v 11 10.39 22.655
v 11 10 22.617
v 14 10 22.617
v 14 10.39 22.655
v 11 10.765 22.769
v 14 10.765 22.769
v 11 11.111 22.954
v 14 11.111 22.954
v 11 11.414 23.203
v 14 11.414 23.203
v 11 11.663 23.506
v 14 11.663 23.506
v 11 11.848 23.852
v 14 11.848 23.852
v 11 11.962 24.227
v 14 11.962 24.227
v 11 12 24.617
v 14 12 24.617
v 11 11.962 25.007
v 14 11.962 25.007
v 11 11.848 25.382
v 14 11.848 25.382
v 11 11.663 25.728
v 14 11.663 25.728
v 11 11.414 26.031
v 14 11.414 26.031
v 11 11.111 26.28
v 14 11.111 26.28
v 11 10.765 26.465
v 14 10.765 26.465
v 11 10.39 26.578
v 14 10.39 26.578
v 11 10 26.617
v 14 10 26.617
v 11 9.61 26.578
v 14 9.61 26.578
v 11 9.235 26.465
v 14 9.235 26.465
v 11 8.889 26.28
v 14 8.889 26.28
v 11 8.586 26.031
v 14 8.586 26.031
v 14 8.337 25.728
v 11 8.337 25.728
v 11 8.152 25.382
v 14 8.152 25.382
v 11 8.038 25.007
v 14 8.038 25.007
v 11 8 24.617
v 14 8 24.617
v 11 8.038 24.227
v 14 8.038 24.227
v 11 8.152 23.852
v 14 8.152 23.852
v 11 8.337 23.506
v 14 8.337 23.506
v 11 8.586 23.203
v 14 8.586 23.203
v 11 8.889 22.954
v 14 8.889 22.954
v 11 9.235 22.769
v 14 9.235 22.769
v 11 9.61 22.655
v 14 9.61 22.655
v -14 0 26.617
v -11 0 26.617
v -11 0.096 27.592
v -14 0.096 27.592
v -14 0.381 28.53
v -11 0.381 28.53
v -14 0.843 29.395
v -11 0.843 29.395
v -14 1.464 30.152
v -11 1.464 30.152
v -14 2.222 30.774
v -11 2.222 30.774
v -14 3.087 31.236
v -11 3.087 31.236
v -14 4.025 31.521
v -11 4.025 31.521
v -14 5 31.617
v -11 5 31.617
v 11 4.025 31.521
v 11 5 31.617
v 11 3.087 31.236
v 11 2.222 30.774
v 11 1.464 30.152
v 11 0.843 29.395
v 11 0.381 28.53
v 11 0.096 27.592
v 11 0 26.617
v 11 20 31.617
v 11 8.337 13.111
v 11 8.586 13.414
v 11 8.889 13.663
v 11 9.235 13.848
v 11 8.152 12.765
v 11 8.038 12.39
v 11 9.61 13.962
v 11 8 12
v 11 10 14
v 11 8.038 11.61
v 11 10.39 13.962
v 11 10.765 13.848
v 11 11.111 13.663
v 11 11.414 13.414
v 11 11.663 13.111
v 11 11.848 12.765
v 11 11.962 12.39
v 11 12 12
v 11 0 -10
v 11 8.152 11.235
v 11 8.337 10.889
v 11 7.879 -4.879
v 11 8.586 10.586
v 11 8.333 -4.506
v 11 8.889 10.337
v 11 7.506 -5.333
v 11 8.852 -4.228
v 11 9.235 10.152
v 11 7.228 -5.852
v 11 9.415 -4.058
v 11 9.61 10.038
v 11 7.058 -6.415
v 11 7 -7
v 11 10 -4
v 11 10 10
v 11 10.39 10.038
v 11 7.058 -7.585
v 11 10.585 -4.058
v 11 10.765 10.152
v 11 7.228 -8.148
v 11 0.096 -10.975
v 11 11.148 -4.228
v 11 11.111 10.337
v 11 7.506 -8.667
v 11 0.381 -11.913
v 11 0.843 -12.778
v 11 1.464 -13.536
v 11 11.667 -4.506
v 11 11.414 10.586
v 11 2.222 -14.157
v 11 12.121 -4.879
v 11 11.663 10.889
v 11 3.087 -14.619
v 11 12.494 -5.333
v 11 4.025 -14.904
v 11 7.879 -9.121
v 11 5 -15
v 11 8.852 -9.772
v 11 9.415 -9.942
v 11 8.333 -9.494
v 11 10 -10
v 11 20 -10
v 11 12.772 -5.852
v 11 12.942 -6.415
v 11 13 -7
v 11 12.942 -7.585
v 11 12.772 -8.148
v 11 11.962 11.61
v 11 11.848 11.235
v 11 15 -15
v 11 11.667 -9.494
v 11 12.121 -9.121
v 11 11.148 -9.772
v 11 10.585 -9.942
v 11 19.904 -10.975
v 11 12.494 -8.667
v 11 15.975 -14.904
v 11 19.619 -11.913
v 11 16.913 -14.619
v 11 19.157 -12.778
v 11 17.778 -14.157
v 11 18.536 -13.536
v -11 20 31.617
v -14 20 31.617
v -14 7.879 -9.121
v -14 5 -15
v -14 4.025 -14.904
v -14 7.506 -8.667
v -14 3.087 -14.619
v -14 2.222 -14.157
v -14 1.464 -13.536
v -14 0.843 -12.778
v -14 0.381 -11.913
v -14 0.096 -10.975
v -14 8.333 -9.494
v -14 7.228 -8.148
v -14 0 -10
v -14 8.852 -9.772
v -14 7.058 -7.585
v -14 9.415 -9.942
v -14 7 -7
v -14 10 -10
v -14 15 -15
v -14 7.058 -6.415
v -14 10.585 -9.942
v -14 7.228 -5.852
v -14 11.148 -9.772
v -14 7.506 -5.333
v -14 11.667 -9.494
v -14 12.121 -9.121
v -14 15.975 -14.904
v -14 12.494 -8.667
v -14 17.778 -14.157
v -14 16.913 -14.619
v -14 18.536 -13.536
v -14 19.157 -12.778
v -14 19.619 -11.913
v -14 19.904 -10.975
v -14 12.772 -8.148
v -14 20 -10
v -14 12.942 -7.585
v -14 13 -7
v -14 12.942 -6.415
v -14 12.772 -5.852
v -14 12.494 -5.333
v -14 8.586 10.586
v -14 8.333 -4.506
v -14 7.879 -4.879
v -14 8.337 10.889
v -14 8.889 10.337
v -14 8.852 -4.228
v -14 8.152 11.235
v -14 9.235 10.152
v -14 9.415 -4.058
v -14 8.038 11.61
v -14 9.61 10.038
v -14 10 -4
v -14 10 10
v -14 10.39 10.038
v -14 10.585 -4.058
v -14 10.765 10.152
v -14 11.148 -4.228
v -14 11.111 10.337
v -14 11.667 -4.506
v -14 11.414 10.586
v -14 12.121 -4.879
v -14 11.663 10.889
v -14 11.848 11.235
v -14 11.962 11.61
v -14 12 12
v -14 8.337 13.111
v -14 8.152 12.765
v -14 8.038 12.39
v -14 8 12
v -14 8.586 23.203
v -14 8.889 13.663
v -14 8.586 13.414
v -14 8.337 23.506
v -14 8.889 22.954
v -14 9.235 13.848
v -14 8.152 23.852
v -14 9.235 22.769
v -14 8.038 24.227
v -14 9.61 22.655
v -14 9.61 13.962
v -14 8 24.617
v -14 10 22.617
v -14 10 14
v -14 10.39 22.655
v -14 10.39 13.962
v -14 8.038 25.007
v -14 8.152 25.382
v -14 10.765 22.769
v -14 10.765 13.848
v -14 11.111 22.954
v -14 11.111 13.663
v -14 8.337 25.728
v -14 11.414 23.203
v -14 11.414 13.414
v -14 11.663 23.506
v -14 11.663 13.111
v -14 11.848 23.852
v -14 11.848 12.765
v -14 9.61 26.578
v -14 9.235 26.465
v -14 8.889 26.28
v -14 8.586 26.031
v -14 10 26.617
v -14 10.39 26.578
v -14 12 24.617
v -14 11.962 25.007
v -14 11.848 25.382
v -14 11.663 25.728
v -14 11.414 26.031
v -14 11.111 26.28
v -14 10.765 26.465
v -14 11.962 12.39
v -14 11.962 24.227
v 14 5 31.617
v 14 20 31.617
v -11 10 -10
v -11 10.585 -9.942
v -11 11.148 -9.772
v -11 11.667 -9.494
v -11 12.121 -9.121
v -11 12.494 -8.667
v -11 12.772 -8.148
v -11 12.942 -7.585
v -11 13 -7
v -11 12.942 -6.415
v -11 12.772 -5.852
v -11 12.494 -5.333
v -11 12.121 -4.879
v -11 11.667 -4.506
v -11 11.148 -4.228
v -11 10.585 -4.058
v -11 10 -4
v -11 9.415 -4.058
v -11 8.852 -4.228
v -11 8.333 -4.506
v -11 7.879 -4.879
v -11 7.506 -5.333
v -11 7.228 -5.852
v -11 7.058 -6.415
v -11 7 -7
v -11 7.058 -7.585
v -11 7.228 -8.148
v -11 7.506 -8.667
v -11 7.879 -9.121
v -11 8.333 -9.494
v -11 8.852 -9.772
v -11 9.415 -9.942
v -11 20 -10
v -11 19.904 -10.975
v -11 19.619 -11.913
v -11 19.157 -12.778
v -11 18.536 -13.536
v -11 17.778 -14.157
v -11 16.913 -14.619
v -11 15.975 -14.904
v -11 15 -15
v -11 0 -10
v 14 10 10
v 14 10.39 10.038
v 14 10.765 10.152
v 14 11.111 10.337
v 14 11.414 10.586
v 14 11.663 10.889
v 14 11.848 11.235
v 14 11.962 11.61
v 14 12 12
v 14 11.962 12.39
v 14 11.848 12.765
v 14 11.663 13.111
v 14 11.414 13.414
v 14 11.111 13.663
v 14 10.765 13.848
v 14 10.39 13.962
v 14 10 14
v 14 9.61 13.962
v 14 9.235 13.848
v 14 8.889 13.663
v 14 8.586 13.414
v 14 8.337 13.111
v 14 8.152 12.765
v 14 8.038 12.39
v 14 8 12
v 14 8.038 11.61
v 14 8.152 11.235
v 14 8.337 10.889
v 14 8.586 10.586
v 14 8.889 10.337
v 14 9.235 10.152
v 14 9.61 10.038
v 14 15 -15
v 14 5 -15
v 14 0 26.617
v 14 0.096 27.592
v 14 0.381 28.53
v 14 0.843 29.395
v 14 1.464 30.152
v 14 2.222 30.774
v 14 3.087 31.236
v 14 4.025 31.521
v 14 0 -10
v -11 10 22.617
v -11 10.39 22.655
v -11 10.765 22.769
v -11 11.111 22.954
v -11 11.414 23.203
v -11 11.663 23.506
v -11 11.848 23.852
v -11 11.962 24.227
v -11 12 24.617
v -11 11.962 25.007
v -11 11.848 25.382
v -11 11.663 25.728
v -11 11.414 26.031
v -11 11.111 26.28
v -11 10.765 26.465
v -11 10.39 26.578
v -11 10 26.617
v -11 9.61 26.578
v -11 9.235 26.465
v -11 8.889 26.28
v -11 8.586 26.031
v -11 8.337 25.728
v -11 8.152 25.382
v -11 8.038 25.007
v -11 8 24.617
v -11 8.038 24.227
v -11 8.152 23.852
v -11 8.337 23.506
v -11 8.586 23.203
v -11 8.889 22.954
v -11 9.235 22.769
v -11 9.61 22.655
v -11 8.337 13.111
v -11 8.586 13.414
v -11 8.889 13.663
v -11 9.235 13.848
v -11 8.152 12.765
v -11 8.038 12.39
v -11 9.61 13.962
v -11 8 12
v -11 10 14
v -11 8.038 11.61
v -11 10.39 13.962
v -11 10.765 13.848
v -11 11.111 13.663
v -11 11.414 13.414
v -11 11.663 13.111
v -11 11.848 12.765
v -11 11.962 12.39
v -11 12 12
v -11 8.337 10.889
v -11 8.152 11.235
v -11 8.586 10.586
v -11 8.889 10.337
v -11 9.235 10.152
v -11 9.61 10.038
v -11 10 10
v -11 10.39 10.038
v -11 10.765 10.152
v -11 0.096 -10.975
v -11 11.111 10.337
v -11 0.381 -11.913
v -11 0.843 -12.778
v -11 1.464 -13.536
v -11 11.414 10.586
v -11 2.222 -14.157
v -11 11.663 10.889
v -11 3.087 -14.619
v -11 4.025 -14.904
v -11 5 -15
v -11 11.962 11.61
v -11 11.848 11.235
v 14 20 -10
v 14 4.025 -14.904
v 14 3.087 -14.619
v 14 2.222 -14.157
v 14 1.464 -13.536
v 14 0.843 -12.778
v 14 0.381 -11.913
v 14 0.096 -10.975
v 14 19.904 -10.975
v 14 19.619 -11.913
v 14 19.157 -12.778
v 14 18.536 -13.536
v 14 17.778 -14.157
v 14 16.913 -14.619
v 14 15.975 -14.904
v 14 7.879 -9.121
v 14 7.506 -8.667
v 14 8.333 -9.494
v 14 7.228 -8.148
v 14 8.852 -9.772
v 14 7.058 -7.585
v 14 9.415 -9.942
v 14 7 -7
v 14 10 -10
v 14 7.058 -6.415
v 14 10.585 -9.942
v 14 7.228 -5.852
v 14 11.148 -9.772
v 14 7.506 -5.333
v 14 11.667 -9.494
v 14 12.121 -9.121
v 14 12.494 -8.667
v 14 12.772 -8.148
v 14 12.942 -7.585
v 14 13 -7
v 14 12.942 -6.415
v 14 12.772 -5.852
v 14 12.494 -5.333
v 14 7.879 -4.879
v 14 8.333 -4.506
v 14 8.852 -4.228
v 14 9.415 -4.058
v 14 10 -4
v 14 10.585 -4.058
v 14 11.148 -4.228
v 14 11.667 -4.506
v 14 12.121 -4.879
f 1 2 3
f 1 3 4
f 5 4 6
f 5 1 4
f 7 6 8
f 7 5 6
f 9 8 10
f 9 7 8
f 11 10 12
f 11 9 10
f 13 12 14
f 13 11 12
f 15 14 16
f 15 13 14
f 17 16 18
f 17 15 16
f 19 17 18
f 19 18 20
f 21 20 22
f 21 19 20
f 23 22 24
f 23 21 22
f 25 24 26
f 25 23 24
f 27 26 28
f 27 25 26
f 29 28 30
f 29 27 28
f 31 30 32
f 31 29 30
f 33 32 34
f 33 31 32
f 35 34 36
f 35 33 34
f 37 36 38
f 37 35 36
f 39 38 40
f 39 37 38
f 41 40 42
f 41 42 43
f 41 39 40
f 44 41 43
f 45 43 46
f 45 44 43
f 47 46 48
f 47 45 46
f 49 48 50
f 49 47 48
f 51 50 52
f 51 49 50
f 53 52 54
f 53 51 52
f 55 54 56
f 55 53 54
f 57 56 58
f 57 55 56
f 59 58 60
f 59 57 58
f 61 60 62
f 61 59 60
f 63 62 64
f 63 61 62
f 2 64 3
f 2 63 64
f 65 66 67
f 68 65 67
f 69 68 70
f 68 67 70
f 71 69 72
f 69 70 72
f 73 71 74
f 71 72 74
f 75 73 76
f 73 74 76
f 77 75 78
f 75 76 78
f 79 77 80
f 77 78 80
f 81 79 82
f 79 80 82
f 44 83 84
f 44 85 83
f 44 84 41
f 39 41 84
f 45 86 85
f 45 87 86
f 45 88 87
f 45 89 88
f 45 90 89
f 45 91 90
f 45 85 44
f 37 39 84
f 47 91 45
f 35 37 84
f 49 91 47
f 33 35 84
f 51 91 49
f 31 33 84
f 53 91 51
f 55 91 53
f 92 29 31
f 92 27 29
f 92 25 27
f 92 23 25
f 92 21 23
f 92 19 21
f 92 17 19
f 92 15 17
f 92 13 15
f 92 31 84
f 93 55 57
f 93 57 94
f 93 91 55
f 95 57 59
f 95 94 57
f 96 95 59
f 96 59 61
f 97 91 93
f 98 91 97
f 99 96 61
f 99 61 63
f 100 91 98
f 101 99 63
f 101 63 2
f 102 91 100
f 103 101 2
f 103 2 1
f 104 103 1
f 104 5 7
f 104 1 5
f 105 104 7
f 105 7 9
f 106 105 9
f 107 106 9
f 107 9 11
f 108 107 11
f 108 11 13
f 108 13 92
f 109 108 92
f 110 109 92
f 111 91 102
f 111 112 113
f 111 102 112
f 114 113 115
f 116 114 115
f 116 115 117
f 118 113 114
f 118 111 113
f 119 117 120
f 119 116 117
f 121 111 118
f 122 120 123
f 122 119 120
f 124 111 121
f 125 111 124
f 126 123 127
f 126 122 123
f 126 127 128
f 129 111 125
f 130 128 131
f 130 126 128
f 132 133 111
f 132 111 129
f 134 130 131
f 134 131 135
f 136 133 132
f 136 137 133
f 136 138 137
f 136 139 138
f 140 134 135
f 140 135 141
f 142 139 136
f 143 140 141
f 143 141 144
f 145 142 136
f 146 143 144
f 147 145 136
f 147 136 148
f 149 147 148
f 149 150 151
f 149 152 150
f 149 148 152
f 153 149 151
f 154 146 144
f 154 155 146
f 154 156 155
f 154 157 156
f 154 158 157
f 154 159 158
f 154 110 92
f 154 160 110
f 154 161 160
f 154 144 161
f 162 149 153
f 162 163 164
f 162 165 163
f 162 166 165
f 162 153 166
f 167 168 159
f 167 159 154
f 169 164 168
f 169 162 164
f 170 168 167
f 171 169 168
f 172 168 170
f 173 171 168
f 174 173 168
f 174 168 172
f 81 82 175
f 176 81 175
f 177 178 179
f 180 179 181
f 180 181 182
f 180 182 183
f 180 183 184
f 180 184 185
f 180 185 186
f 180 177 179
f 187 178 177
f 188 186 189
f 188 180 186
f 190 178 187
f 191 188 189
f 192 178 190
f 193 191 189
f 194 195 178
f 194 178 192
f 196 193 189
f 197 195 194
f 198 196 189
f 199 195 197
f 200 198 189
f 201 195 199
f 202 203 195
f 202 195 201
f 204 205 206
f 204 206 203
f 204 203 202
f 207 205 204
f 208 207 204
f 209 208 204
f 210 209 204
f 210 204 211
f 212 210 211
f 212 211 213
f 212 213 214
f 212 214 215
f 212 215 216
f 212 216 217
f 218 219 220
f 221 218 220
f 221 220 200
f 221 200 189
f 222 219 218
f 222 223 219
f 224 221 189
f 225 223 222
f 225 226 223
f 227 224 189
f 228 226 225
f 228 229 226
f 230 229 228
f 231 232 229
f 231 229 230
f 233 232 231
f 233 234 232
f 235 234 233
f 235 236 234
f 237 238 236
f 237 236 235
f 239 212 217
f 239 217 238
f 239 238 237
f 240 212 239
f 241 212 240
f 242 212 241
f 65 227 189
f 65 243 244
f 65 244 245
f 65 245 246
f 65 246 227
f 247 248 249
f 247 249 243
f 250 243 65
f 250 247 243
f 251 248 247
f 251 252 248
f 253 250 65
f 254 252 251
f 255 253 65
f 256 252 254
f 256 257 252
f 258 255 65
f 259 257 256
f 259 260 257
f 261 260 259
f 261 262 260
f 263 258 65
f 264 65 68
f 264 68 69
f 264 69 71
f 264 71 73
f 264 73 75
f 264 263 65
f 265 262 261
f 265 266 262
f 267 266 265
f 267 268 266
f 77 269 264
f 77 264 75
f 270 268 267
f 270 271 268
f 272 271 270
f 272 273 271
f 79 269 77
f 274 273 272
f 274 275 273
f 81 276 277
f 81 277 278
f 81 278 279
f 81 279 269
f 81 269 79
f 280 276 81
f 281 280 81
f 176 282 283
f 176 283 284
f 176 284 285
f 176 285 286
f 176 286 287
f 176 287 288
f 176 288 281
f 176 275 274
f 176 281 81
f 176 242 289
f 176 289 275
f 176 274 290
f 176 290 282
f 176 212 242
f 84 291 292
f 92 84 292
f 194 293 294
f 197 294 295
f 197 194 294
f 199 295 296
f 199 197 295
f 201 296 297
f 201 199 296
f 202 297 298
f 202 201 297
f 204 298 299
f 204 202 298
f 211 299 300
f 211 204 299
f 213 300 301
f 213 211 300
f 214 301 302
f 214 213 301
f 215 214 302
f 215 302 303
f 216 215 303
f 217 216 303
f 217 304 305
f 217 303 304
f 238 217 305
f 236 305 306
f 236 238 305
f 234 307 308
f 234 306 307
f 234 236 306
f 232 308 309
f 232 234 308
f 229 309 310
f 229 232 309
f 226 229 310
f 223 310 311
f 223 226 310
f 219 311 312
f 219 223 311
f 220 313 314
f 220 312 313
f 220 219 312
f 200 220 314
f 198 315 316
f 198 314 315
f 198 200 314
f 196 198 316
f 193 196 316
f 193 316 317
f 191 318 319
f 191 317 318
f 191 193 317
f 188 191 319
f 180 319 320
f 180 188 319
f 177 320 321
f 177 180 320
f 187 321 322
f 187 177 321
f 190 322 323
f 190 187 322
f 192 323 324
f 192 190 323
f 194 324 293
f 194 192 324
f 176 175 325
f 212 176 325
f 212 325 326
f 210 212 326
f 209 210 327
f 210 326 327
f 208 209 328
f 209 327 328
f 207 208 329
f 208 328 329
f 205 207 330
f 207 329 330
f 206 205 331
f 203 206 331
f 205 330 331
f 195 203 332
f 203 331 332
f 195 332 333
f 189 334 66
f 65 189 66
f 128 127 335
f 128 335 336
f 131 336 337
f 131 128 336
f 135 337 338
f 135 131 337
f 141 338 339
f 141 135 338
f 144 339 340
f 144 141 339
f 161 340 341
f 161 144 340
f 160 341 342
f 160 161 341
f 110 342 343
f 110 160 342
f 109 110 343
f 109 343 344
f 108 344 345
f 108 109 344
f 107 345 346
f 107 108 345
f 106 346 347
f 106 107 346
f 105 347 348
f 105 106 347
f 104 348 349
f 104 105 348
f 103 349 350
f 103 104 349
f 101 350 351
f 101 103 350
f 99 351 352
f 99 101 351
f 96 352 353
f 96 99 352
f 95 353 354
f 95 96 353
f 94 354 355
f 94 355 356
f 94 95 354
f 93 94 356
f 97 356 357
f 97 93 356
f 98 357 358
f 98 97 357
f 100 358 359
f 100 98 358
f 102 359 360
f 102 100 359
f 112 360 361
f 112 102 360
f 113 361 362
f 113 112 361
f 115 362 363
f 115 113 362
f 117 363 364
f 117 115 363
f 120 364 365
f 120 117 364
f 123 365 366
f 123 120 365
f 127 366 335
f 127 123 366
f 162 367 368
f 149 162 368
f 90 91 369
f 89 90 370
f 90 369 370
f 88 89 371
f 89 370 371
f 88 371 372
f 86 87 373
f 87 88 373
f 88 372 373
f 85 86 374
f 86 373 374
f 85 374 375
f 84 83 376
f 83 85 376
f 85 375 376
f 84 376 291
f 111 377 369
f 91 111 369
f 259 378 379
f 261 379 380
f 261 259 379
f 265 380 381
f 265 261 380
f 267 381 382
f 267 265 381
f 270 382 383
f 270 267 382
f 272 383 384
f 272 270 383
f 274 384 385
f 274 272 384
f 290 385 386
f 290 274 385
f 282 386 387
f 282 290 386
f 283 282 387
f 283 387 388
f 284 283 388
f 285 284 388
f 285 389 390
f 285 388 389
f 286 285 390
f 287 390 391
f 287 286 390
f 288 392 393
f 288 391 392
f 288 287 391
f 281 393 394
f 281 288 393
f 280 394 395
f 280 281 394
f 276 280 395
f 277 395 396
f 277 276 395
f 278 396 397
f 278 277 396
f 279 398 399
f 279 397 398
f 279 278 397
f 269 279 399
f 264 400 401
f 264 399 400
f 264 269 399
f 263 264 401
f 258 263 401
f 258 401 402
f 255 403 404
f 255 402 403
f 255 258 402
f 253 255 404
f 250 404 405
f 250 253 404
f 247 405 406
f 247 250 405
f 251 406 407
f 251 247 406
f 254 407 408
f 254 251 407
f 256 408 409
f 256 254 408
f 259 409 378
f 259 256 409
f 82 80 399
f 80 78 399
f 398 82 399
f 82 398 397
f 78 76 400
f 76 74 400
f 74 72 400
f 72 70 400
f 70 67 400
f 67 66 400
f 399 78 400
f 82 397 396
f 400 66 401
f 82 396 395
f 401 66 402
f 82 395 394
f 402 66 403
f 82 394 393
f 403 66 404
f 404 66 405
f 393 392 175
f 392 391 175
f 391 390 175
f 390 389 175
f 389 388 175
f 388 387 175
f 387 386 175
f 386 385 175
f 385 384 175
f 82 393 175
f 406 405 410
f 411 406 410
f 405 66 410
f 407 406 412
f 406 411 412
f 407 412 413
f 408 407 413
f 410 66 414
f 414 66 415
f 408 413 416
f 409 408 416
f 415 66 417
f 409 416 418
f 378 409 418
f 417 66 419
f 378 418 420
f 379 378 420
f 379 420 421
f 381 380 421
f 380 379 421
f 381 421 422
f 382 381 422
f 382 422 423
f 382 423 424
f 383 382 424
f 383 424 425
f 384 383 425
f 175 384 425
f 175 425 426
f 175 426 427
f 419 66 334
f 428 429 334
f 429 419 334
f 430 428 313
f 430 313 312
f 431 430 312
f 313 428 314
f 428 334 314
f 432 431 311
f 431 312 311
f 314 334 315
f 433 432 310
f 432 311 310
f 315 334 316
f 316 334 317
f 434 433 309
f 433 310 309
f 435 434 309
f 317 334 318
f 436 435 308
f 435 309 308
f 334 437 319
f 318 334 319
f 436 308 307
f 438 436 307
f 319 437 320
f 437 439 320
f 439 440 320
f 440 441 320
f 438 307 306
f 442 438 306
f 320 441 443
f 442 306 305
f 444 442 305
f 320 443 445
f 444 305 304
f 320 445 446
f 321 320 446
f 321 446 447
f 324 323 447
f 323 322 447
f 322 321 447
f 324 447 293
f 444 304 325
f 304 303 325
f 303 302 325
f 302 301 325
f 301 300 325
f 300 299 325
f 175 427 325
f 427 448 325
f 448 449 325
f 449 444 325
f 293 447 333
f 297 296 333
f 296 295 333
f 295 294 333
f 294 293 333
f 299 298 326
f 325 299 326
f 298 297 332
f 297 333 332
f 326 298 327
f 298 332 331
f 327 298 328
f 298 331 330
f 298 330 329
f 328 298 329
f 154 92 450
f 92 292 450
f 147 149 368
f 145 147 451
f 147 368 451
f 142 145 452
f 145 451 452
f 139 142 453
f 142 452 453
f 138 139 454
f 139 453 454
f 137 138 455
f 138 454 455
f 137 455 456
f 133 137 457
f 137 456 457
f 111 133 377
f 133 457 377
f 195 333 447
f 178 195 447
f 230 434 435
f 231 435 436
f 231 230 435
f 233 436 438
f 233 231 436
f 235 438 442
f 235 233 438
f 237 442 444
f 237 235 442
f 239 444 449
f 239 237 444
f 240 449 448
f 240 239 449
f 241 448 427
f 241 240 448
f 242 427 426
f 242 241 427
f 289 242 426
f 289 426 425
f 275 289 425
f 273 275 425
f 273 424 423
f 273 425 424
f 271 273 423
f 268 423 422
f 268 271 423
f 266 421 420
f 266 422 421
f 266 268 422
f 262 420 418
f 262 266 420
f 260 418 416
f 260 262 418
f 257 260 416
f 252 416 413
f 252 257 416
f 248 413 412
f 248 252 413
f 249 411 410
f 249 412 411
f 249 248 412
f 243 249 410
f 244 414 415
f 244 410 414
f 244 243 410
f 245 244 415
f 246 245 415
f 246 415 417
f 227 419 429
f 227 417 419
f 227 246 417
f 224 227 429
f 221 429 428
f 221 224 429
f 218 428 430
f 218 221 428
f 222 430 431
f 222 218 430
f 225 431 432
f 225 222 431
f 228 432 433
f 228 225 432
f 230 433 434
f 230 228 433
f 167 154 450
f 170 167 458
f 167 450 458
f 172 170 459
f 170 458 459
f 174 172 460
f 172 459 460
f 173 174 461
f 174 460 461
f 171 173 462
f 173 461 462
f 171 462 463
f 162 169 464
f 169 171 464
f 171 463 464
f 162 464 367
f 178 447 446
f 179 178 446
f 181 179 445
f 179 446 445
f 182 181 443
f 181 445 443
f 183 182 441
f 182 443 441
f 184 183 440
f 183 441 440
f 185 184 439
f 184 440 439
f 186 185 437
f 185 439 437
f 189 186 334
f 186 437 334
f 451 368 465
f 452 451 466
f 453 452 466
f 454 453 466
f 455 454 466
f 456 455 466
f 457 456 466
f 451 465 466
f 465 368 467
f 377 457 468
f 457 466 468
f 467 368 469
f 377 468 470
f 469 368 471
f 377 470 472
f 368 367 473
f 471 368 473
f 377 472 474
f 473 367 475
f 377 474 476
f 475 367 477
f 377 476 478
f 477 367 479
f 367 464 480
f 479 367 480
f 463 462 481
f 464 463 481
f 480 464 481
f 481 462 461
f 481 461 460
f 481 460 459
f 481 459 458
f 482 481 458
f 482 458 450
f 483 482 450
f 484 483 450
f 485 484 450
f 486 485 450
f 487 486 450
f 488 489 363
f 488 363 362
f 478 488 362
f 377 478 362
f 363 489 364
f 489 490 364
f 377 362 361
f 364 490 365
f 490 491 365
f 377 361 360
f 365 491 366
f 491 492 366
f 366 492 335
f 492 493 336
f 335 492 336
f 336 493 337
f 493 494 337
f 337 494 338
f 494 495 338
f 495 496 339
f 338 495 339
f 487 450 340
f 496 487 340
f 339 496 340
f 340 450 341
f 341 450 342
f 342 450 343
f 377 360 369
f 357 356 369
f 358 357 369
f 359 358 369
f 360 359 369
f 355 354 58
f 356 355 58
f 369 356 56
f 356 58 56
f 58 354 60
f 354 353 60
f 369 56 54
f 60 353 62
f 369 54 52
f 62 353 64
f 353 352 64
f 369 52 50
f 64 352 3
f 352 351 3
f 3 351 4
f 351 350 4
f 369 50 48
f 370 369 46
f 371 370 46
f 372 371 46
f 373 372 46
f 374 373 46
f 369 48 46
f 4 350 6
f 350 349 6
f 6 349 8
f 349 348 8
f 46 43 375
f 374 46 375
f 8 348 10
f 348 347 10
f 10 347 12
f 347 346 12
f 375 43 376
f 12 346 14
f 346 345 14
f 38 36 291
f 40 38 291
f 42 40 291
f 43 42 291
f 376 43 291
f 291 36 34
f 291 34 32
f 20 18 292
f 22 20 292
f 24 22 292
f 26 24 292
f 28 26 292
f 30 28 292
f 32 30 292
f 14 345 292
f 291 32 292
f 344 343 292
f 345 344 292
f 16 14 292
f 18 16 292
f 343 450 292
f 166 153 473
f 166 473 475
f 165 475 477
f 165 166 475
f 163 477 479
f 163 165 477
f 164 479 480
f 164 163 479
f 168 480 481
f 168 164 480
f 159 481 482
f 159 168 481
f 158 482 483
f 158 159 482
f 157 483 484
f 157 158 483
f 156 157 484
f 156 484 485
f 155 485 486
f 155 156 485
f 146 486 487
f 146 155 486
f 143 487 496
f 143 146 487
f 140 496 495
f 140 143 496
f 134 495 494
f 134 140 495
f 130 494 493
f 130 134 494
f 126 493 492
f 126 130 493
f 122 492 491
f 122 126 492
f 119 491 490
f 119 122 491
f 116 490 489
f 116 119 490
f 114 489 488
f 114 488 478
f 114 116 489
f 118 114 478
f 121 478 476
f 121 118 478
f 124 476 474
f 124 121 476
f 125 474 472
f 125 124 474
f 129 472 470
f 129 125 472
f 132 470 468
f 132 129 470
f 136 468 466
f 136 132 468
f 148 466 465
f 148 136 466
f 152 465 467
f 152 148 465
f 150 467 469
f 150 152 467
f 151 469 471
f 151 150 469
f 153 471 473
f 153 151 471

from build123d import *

# Parameters (mm, degrees)
SZKIC1_R                        = 2
SZKIC1_R_2                      = 3
DODANIE_WYCI_GNI_CIE1_DEPTH     = 14
SZKIC2_W                        = 22
SZKIC2_H                        = 20
WYTNIJ_WYCI_GNI_CIE1_DEPTH      = 32.61688289
WYTNIJ_WYCI_GNI_CIE1_DEPTH_BACK = 16


with BuildPart() as part:
    # Szkic1 → Dodanie-wyciągnięcie1 (new body, symmetric)
    with BuildSketch(Plane(origin=(0, 0, 0), x_dir=(0, 0, -1), z_dir=(1, 0, 0))):
        with BuildLine():
            Line((0, 0), (-26.61688289, 0))
            ThreePointArc((-26.61688289, 0), (-30.152416796, 1.464466094), (-31.61688289, 5))
            Line((-31.61688289, 5), (-31.61688289, 20))
            Line((-31.61688289, 20), (5, 20))
            Line((5, 20), (10, 20))
            ThreePointArc((10, 20), (13.535533906, 18.535533906), (15, 15))
            Line((15, 15), (15, 5))
            ThreePointArc((15, 5), (13.535533906, 1.464466094), (10, 0))
            Line((10, 0), (0, 0))
        make_face()
        with Locations((-24.61688289, 10)):
            Circle(SZKIC1_R, mode=Mode.SUBTRACT)
        with Locations((-12, 10)):
            Circle(SZKIC1_R, mode=Mode.SUBTRACT)
        with Locations((7, 10)):
            Circle(SZKIC1_R_2, mode=Mode.SUBTRACT)
    extrude(amount=DODANIE_WYCI_GNI_CIE1_DEPTH, both=True)

    # Szkic2 → Wytnij-wyciągnięcie1 (cut, two sides)
    with BuildSketch(Plane.XY) as wytnij_wyci_gni_cie1_sk:
        with Locations((0, 10)):
            Rectangle(SZKIC2_W, SZKIC2_H)
    extrude(amount=WYTNIJ_WYCI_GNI_CIE1_DEPTH, mode=Mode.SUBTRACT)
    extrude(wytnij_wyci_gni_cie1_sk.sketch, amount=-WYTNIJ_WYCI_GNI_CIE1_DEPTH_BACK, mode=Mode.SUBTRACT)


solid = part.part
